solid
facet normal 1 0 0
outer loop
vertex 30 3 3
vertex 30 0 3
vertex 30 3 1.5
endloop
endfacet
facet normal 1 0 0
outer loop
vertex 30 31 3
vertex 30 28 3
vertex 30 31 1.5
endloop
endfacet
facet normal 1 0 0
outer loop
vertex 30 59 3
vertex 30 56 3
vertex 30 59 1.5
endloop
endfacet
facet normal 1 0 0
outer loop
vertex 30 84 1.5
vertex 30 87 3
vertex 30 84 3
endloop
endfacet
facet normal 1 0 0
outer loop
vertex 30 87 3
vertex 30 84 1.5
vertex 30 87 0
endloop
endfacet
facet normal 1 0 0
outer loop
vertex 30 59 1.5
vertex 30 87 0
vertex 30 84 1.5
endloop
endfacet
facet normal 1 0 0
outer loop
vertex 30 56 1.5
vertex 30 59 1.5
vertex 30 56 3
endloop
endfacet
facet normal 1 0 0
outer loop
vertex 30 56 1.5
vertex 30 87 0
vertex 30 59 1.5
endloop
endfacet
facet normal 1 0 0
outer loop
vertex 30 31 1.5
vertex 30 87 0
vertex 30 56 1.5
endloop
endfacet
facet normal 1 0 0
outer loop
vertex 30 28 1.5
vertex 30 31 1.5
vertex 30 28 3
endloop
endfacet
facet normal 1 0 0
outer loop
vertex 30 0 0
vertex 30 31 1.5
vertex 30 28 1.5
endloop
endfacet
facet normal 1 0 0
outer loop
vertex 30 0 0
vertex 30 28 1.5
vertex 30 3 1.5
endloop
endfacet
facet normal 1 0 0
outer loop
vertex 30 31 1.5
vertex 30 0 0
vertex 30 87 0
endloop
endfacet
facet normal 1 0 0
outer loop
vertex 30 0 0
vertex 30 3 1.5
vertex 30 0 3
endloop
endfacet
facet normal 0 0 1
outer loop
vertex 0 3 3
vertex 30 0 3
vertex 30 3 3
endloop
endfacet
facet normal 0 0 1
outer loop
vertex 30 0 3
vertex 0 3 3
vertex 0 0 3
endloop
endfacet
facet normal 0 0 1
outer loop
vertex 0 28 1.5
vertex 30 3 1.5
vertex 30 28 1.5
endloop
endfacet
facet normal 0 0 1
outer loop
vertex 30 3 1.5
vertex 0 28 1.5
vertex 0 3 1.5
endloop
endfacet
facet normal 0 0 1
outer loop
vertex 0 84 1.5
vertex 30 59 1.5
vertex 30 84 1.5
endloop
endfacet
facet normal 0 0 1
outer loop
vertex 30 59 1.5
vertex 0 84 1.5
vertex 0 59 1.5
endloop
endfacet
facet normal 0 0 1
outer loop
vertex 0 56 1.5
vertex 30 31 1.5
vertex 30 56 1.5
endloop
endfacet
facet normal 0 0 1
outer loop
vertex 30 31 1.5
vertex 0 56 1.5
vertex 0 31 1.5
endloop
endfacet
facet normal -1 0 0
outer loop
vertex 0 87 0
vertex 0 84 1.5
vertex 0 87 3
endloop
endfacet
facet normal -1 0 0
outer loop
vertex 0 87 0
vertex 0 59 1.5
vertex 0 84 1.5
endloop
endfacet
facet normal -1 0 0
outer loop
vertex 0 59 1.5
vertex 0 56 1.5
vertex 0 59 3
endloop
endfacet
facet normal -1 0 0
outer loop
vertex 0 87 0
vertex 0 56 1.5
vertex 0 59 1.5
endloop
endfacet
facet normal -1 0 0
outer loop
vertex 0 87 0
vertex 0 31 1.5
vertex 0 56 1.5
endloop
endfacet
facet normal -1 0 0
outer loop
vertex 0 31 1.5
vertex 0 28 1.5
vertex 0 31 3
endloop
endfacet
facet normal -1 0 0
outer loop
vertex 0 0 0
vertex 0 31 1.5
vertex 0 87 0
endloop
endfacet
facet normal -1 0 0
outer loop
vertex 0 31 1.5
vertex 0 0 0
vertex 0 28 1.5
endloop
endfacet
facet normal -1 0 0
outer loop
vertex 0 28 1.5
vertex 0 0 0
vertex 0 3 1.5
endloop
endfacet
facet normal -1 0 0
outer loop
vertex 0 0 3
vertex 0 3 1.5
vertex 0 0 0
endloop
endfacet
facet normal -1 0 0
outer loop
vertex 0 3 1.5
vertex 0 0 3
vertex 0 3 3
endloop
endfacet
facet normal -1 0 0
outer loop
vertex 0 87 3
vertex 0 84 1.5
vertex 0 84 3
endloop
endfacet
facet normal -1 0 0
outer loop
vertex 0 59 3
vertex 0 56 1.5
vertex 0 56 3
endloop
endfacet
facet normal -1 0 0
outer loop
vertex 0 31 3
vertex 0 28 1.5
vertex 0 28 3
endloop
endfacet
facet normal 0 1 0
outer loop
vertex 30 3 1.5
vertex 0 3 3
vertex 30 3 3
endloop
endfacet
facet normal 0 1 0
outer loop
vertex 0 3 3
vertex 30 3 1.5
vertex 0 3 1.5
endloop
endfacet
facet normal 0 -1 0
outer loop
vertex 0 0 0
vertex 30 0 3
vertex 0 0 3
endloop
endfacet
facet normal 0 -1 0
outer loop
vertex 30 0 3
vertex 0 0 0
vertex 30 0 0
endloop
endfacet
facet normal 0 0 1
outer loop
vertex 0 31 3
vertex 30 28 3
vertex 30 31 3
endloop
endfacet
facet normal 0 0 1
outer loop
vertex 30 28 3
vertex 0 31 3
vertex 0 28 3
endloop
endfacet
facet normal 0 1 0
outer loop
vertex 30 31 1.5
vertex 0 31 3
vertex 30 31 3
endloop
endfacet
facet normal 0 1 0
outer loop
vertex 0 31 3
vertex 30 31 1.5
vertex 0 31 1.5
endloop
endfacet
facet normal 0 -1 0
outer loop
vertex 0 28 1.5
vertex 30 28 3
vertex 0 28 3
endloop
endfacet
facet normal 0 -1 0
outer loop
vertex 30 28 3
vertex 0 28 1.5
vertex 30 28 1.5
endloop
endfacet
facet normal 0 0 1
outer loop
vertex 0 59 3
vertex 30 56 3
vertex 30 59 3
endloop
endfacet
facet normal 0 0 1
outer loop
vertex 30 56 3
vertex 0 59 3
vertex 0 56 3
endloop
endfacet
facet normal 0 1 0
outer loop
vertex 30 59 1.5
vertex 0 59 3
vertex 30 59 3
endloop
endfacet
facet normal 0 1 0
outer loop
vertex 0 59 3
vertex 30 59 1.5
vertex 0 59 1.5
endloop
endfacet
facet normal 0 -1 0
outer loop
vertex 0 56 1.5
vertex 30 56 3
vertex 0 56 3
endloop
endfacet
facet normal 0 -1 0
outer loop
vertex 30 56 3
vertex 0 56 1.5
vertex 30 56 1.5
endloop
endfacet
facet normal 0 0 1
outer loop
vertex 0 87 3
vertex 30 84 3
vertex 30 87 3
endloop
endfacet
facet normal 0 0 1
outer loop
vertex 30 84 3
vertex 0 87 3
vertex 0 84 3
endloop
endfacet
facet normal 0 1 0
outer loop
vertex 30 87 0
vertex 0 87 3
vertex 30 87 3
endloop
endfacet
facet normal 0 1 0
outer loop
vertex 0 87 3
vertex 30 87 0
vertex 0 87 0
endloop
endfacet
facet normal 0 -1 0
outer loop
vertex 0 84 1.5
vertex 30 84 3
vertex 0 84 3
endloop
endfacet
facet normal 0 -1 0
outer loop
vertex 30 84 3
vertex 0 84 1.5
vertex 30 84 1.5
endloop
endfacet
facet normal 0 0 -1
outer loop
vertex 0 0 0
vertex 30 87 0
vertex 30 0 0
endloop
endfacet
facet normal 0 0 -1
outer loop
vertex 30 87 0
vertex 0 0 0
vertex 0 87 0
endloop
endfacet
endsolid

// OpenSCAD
// [FL_INDEX: keywords="openscad, 3d_parametric, Cuttingboard_holder, csg_solid" | COT="Parametric OpenSCAD design from 3DCodeverse"]
// Title: Cuttingboard holder

// number of boards
count=3;

// board thickness
board_thickness=25;

// holder width
holder_width=30;

// divider thickness
divider=3;

// height of the holder
holder_height=3;

module board(){

union(){
	cube([holder_width,divider * (count+1) + board_thickness * count,holder_height/2]);
		for (i=[0:count]){
			translate([0,i * (divider + board_thickness), holder_height/2.0]){
				cube([holder_width,divider,holder_height/2.0]);
			}

		}
	}
}

board();
